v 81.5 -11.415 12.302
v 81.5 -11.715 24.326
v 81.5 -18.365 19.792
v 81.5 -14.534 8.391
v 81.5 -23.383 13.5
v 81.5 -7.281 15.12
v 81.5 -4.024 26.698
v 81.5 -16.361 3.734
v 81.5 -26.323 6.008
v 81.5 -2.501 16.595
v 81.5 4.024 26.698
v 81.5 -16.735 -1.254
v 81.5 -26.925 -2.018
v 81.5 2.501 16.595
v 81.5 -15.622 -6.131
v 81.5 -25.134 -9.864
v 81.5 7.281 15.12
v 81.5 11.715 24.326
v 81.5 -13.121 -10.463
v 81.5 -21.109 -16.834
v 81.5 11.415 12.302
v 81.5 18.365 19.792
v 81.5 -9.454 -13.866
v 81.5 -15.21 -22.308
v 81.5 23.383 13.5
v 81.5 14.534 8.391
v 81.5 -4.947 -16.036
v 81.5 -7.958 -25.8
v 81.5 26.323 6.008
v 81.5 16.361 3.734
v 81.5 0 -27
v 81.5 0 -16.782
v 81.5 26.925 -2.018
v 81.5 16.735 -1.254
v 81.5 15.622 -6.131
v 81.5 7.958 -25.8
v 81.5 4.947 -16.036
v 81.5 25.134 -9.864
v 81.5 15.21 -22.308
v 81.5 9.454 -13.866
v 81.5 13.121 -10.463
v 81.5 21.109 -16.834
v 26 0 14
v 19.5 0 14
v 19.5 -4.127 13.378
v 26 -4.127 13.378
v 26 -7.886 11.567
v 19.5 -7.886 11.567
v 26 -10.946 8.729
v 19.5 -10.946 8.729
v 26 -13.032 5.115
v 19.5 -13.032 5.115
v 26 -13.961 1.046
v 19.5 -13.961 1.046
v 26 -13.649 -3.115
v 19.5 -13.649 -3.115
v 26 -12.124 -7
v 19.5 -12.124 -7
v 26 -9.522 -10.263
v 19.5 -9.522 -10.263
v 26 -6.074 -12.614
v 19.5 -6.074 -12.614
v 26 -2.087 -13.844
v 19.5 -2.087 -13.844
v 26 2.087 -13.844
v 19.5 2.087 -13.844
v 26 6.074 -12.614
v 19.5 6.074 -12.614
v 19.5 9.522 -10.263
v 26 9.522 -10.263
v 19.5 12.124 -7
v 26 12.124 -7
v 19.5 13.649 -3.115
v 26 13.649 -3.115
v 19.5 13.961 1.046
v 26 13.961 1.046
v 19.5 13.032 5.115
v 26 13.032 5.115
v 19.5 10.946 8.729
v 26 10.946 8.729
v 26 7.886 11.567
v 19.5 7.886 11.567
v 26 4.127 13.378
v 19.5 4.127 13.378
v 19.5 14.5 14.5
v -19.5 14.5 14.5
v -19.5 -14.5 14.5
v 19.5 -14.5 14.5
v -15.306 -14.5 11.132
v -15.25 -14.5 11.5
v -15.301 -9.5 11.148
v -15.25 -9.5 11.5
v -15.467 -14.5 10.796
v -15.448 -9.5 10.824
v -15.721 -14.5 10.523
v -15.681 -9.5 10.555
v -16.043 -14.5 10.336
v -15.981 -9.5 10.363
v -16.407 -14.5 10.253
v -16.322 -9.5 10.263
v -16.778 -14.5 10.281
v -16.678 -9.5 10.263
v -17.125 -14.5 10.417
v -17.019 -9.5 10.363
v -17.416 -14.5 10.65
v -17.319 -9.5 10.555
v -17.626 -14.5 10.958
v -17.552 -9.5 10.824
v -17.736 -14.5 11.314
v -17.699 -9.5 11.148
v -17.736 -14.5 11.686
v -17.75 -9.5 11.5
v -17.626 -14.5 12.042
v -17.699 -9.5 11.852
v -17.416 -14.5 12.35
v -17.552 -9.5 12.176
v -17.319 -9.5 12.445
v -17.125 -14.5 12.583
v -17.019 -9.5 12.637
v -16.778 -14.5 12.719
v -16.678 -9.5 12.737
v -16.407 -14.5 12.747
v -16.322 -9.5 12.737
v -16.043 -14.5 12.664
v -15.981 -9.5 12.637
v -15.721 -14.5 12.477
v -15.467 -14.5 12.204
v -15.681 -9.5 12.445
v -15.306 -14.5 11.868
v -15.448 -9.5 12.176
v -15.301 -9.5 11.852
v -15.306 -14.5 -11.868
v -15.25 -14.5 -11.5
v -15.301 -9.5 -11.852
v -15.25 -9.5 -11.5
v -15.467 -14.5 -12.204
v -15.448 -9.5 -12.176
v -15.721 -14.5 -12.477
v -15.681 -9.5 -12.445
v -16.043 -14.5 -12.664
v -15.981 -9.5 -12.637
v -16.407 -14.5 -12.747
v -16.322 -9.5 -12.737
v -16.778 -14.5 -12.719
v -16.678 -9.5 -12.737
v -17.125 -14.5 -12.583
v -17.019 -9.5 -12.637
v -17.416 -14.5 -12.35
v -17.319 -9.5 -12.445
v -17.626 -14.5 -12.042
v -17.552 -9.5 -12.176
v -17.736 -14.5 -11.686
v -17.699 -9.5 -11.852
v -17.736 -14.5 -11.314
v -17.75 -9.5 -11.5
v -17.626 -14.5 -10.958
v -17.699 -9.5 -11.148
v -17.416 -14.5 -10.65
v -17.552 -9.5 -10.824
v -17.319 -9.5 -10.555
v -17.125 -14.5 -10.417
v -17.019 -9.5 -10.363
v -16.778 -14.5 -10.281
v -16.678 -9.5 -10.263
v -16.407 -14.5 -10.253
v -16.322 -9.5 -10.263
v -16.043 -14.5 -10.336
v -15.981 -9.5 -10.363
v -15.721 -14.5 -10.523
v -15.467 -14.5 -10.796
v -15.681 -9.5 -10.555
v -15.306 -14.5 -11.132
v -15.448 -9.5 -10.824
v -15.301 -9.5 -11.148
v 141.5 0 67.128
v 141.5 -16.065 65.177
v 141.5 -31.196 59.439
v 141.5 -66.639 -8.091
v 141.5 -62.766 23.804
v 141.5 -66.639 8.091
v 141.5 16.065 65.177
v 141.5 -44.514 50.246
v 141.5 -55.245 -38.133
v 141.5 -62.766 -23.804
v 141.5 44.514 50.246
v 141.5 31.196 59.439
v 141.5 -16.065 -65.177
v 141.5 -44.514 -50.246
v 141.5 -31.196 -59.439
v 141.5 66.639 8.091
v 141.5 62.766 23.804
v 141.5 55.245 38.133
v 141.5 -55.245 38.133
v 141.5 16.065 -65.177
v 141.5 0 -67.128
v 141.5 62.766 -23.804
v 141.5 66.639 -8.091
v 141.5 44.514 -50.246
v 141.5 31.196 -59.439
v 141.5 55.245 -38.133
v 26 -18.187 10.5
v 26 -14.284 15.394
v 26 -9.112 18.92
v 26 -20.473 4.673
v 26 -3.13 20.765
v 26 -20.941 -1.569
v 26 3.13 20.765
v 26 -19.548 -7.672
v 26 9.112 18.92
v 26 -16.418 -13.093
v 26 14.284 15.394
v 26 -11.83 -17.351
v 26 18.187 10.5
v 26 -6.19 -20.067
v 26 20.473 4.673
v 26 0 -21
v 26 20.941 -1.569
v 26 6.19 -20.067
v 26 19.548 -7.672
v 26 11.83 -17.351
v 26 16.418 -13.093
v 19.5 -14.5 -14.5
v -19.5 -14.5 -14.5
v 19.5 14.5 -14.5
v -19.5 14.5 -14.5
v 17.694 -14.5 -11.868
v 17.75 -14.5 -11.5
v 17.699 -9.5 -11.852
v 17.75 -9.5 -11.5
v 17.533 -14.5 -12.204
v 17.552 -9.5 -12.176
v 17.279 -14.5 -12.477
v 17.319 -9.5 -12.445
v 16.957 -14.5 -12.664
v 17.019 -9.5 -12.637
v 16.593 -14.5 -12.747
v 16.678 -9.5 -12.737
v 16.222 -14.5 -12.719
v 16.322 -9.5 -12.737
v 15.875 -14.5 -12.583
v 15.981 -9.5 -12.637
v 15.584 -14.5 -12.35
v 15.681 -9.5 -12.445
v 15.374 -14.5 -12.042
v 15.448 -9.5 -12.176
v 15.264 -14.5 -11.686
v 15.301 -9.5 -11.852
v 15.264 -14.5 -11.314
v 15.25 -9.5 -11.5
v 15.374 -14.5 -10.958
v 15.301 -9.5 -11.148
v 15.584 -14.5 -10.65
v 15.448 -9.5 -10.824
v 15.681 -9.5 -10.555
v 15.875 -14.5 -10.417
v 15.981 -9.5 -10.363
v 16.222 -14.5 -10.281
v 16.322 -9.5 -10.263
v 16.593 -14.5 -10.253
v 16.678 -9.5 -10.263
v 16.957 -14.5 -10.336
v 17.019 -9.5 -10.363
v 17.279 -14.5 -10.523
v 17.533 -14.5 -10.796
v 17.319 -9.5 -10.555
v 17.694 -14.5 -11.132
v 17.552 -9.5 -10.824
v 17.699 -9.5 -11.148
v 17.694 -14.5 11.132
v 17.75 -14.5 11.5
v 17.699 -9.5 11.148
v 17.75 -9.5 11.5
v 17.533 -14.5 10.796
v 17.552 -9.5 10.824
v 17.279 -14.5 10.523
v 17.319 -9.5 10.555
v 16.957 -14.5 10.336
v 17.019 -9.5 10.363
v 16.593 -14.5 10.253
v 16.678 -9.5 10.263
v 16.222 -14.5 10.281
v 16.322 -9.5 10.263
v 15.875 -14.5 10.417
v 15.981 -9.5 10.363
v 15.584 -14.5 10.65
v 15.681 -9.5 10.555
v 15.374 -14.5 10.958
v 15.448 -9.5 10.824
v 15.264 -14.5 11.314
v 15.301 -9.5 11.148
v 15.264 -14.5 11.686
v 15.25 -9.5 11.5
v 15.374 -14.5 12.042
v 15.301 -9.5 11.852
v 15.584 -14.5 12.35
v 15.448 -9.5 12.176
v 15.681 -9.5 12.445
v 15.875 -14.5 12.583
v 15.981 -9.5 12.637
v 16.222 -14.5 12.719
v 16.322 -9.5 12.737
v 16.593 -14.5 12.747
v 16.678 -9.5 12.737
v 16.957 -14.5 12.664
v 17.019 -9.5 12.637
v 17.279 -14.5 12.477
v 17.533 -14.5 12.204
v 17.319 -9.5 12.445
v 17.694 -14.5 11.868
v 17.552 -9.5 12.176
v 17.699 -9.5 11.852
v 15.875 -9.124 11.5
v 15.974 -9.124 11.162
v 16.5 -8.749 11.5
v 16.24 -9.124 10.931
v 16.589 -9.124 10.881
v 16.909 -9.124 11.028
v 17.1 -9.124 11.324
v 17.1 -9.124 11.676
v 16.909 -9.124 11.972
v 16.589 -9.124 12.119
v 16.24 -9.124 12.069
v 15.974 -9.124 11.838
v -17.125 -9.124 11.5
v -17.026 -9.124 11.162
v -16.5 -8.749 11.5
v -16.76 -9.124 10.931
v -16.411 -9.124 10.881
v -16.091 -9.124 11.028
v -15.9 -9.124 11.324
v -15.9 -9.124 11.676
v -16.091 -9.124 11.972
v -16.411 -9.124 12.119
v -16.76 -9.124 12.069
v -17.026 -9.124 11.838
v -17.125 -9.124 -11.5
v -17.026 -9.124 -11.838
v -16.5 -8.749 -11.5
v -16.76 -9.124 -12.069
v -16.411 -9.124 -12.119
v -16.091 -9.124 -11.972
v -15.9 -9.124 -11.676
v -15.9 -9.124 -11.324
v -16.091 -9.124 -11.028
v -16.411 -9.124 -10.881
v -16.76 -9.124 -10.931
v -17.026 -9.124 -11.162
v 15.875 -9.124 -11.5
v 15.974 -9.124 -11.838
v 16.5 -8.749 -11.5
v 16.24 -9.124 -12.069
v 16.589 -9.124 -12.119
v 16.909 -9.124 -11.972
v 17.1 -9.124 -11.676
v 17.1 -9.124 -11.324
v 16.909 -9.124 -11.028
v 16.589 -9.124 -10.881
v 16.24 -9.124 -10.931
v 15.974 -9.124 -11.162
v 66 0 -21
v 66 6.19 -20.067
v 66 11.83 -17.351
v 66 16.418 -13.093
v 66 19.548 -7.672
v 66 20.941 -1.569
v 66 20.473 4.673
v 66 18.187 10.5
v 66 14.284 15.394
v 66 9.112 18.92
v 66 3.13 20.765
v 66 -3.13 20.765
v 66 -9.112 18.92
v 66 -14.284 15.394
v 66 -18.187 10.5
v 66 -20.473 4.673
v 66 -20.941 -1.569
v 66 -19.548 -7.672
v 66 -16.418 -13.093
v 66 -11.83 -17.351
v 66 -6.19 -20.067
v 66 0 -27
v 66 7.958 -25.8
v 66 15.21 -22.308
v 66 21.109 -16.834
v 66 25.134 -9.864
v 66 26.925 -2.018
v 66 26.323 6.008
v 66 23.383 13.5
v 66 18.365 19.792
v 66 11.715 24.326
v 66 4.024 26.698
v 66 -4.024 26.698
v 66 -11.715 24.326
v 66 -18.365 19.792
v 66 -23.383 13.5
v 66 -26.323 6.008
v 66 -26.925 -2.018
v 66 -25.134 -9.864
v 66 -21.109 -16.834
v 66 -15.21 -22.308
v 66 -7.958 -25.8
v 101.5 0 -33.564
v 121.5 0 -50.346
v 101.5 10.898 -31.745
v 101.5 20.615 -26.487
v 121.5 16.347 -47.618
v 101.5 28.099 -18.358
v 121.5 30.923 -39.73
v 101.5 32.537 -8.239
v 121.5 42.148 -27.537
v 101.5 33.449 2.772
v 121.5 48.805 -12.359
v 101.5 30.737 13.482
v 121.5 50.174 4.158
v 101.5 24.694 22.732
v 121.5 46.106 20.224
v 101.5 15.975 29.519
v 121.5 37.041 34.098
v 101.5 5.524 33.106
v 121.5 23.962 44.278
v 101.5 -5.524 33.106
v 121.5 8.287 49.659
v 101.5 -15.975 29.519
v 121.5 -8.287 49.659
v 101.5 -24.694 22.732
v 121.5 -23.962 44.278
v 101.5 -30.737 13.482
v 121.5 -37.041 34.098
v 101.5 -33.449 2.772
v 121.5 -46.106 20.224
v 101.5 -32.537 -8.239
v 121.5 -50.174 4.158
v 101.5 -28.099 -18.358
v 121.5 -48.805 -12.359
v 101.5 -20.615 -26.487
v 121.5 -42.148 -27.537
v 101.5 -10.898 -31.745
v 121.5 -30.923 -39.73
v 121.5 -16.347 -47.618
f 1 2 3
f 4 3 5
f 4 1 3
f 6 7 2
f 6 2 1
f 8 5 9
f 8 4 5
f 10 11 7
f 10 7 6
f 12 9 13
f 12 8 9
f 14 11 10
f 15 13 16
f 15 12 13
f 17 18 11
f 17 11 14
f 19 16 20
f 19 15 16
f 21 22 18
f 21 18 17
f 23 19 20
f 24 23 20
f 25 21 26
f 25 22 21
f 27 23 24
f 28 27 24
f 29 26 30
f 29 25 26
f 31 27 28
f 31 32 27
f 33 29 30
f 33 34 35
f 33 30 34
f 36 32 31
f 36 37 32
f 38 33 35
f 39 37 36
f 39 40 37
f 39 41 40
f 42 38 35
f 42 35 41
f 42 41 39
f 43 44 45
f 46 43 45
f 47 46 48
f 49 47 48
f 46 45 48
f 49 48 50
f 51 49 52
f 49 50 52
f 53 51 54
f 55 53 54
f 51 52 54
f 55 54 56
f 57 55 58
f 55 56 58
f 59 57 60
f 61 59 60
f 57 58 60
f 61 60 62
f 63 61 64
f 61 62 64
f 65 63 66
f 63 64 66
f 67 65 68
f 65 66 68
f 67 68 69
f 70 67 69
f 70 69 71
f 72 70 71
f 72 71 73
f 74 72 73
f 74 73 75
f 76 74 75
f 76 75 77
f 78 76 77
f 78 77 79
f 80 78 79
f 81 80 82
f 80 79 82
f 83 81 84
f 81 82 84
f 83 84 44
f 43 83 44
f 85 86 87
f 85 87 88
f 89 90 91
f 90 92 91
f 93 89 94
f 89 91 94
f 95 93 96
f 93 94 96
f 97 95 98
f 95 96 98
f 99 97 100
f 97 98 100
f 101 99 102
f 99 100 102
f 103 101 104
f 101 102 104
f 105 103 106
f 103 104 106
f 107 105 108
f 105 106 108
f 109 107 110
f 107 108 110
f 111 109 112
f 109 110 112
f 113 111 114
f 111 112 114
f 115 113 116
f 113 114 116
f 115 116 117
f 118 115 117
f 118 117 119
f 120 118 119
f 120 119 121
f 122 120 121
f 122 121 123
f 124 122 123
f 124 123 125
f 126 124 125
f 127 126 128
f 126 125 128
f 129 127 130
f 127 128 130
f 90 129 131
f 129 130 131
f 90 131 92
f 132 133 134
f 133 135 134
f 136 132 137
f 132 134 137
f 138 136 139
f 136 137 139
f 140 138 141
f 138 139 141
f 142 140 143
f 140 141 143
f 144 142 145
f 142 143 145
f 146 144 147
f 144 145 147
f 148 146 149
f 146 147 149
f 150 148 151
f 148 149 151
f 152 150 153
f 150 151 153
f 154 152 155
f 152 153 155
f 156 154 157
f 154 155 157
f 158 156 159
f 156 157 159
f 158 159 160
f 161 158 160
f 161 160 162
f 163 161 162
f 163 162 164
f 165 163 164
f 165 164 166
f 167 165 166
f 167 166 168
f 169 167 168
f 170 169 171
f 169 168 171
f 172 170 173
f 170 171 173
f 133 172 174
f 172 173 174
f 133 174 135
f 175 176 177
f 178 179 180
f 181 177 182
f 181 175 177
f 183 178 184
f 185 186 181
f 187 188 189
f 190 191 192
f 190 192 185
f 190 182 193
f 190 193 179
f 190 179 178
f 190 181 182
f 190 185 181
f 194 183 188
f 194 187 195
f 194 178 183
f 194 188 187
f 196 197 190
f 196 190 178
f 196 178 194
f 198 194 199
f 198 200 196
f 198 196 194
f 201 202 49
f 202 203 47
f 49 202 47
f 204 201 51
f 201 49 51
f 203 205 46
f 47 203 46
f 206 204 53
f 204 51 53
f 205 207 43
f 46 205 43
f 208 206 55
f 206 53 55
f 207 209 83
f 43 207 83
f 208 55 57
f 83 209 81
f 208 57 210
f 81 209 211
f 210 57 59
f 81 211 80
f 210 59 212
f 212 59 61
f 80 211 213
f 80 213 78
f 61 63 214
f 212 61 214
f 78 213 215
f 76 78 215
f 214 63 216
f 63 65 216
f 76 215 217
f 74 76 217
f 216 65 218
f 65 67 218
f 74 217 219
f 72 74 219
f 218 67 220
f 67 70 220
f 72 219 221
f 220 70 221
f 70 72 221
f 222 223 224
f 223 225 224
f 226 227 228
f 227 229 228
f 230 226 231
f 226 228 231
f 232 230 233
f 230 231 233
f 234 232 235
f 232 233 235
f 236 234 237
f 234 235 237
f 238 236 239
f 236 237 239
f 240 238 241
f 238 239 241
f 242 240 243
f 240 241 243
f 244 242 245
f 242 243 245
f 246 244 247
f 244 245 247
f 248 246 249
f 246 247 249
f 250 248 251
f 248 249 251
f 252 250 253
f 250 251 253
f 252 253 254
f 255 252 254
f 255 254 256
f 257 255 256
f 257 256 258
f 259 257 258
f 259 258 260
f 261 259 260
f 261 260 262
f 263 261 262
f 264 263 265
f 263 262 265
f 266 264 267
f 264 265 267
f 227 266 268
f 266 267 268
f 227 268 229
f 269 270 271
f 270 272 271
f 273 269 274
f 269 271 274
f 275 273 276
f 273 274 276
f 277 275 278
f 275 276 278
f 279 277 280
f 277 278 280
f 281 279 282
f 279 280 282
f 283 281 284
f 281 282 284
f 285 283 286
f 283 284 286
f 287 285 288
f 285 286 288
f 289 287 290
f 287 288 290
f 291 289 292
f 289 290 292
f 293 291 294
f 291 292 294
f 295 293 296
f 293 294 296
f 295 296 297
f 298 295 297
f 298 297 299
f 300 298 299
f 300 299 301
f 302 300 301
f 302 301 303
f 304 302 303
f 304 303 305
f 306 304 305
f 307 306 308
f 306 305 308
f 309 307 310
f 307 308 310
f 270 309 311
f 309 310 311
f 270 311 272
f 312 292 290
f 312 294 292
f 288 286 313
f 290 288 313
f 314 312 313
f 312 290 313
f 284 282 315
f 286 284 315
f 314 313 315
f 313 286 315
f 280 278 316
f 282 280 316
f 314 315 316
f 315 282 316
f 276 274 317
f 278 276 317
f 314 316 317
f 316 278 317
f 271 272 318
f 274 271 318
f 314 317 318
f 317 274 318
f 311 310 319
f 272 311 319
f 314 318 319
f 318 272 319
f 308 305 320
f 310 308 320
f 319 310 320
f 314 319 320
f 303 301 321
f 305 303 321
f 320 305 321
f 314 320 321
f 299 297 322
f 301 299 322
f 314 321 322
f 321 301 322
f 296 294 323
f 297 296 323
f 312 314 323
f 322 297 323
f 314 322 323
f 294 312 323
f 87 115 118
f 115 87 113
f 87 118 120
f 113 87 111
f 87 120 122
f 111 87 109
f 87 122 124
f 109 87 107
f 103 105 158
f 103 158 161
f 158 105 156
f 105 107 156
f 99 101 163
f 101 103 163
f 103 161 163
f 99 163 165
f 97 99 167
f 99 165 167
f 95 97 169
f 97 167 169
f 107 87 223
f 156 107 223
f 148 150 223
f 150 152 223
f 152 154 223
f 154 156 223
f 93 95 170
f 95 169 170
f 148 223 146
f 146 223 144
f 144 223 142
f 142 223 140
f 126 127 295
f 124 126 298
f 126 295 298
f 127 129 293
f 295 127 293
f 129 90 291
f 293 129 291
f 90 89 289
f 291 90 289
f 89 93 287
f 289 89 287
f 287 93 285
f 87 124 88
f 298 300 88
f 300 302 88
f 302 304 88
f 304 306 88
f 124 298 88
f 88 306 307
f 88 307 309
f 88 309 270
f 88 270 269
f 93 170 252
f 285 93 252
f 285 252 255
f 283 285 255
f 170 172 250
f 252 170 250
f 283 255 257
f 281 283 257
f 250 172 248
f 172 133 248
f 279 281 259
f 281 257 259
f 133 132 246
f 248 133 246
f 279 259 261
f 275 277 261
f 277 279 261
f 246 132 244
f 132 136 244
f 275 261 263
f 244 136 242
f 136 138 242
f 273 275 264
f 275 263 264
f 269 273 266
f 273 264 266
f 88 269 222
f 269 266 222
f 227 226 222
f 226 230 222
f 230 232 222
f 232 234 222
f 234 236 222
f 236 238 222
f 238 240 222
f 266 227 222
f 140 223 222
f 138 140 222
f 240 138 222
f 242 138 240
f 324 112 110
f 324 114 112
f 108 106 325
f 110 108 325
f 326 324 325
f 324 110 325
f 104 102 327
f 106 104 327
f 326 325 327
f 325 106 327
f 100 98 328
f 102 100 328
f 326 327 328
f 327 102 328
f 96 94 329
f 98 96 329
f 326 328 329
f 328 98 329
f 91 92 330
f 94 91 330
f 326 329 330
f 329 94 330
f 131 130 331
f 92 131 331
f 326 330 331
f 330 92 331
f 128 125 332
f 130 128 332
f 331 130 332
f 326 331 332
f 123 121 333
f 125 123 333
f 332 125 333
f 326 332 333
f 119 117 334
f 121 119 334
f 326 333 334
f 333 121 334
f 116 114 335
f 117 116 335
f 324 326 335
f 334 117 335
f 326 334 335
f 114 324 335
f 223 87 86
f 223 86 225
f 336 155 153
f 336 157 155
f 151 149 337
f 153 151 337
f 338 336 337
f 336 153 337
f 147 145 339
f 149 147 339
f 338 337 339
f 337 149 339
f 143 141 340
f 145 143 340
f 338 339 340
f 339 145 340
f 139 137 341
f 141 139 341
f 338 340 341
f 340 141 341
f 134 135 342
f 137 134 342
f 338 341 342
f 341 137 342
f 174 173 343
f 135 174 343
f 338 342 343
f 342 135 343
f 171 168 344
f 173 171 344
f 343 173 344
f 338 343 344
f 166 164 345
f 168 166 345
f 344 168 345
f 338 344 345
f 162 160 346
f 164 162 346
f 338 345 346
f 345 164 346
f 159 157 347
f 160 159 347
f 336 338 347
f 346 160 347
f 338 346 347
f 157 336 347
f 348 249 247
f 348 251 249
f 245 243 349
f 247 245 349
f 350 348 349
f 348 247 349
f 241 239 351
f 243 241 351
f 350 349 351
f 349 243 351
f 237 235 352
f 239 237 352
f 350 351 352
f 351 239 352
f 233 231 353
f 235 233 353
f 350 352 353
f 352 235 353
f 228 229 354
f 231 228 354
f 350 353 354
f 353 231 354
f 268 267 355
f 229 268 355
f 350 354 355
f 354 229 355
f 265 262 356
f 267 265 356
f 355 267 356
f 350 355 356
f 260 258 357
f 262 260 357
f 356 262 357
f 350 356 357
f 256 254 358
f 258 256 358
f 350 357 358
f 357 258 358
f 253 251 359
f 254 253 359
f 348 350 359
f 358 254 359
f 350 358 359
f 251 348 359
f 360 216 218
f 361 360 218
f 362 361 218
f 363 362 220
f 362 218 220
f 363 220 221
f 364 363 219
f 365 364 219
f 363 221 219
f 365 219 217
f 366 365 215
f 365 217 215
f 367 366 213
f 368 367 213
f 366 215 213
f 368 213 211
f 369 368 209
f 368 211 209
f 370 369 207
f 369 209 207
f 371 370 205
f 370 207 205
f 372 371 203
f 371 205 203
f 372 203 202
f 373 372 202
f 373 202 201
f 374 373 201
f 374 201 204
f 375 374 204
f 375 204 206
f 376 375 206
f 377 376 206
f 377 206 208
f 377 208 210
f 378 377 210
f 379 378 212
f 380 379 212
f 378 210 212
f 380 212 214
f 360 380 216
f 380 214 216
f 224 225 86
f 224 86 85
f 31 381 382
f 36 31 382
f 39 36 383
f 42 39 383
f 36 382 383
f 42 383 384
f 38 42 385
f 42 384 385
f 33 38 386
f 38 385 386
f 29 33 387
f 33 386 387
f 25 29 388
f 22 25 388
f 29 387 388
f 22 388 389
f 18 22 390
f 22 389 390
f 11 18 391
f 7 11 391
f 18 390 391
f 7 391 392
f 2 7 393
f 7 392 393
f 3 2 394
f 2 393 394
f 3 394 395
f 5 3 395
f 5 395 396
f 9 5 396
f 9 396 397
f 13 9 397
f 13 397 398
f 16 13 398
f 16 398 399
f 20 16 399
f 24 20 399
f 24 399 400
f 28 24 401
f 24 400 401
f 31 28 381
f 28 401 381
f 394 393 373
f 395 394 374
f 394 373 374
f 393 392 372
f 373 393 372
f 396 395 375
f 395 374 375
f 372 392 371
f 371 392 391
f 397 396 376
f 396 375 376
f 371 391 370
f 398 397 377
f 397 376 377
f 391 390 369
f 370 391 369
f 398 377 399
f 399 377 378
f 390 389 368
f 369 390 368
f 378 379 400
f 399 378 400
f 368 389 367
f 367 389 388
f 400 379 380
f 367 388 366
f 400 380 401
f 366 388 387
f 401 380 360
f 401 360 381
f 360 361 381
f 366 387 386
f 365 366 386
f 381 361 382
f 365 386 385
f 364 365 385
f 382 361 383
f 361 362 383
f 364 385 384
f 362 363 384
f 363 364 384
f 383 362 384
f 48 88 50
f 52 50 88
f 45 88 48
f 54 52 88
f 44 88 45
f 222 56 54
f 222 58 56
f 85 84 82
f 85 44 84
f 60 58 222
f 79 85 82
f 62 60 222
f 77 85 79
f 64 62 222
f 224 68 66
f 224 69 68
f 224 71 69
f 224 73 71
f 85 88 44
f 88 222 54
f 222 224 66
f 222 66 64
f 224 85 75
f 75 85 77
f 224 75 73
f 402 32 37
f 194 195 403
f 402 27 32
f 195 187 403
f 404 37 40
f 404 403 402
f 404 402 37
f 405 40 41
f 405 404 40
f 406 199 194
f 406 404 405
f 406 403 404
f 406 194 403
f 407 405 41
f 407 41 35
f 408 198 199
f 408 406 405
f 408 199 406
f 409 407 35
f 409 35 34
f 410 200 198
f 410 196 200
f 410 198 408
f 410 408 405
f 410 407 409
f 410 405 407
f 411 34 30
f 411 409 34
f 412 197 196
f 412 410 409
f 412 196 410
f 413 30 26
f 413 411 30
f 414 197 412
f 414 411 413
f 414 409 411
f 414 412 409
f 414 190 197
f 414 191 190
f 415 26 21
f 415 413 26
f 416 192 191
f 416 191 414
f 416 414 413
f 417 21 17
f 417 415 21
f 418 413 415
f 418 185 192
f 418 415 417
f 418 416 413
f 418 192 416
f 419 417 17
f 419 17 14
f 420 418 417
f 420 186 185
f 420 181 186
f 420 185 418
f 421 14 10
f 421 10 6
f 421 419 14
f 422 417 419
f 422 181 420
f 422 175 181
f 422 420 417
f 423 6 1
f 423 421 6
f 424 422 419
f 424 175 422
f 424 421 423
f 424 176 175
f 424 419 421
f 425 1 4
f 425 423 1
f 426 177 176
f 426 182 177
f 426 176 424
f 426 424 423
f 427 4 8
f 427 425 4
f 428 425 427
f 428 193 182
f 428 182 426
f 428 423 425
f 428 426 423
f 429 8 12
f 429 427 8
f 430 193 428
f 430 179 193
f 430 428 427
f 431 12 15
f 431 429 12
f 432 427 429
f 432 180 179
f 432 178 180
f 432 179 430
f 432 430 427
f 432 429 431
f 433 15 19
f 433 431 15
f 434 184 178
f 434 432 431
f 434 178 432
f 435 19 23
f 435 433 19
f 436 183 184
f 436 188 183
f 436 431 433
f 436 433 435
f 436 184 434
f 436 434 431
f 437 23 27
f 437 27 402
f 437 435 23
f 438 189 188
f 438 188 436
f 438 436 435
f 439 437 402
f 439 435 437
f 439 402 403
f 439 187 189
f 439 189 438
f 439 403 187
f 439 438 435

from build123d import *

# Parameters (mm, degrees)
SKETCH2_W                 = 39
SKETCH2_H                 = 29
BOSS_EXTRUDE1_DEPTH       = 14.5
SKETCH4_R                 = 14
BOSS_EXTRUDE2_DEPTH       = 6.5
SKETCH5_R                 = 21
BOSS_EXTRUDE3_DEPTH       = 40
SKETCH6_R                 = 27
BOSS_EXTRUDE4_DEPTH       = 15.5
M3X0_5_TAPPED_HOLE1_D     = 2.5
M3X0_5_TAPPED_HOLE1_DEPTH = 5
M3X0_5_TAPPED_HOLE1_TIP   = 0.751075774


with BuildPart() as part:
    # Sketch2 → Boss-Extrude1 (new, symmetric)
    with BuildSketch(Plane(origin=(0, 0, 0), x_dir=(1, 0, 0), z_dir=(0, 1, 0))):
        Rectangle(SKETCH2_W, SKETCH2_H)
    extrude(amount=BOSS_EXTRUDE1_DEPTH, both=True)

    # Sketch4 → Boss-Extrude2 (add)
    with BuildSketch(Plane(origin=(19.5, 0, 0), x_dir=(0, 0, -1), z_dir=(1, 0, 0))):
        with Locations(Location((0, 0, 0), (0, 0, 180))):
            Circle(SKETCH4_R)
    extrude(amount=BOSS_EXTRUDE2_DEPTH)

    # Sketch5 → Boss-Extrude3 (add)
    with BuildSketch(Plane(origin=(26, 0, 0), x_dir=(0, 0, -1), z_dir=(1, 0, 0))):
        Circle(SKETCH5_R)
    extrude(amount=BOSS_EXTRUDE3_DEPTH)

    # Sketch6 → Boss-Extrude4 (add)
    with BuildSketch(Plane(origin=(66, 0, 0), x_dir=(0, 0, -1), z_dir=(1, 0, 0))):
        Circle(SKETCH6_R)
    extrude(amount=BOSS_EXTRUDE4_DEPTH)

    # M3x0.5 Tapped Hole1
    with Locations(Plane(origin=(0, -14.5, 0), x_dir=(-1, 0, 0), z_dir=(0, -1, 0))):
        with Locations((-16.5, 11.5), (16.5, 11.5), (16.5, -11.5), (-16.5, -11.5)):
            Hole(M3X0_5_TAPPED_HOLE1_D / 2, depth=M3X0_5_TAPPED_HOLE1_DEPTH)
            with Locations((0, 0, -(M3X0_5_TAPPED_HOLE1_DEPTH + M3X0_5_TAPPED_HOLE1_TIP / 2))):  # 118° drill point
                Cone(0, M3X0_5_TAPPED_HOLE1_D / 2, M3X0_5_TAPPED_HOLE1_TIP, mode=Mode.SUBTRACT)

    # Sketch12 → Revolve1 (revolve)
    with BuildSketch(Plane.XY, mode=Mode.PRIVATE) as revolve1_sk:
        Polygon((61.5, 0), (141.5, 67.127970494), (141.5, 0), align=None)
    revolve(revolve1_sk.sketch.rotate(Axis((61.5, 0, 0), (1, 0, 0)), 270), axis=Axis((61.5, 0, 0), (1, 0, 0)))


solid = part.part
